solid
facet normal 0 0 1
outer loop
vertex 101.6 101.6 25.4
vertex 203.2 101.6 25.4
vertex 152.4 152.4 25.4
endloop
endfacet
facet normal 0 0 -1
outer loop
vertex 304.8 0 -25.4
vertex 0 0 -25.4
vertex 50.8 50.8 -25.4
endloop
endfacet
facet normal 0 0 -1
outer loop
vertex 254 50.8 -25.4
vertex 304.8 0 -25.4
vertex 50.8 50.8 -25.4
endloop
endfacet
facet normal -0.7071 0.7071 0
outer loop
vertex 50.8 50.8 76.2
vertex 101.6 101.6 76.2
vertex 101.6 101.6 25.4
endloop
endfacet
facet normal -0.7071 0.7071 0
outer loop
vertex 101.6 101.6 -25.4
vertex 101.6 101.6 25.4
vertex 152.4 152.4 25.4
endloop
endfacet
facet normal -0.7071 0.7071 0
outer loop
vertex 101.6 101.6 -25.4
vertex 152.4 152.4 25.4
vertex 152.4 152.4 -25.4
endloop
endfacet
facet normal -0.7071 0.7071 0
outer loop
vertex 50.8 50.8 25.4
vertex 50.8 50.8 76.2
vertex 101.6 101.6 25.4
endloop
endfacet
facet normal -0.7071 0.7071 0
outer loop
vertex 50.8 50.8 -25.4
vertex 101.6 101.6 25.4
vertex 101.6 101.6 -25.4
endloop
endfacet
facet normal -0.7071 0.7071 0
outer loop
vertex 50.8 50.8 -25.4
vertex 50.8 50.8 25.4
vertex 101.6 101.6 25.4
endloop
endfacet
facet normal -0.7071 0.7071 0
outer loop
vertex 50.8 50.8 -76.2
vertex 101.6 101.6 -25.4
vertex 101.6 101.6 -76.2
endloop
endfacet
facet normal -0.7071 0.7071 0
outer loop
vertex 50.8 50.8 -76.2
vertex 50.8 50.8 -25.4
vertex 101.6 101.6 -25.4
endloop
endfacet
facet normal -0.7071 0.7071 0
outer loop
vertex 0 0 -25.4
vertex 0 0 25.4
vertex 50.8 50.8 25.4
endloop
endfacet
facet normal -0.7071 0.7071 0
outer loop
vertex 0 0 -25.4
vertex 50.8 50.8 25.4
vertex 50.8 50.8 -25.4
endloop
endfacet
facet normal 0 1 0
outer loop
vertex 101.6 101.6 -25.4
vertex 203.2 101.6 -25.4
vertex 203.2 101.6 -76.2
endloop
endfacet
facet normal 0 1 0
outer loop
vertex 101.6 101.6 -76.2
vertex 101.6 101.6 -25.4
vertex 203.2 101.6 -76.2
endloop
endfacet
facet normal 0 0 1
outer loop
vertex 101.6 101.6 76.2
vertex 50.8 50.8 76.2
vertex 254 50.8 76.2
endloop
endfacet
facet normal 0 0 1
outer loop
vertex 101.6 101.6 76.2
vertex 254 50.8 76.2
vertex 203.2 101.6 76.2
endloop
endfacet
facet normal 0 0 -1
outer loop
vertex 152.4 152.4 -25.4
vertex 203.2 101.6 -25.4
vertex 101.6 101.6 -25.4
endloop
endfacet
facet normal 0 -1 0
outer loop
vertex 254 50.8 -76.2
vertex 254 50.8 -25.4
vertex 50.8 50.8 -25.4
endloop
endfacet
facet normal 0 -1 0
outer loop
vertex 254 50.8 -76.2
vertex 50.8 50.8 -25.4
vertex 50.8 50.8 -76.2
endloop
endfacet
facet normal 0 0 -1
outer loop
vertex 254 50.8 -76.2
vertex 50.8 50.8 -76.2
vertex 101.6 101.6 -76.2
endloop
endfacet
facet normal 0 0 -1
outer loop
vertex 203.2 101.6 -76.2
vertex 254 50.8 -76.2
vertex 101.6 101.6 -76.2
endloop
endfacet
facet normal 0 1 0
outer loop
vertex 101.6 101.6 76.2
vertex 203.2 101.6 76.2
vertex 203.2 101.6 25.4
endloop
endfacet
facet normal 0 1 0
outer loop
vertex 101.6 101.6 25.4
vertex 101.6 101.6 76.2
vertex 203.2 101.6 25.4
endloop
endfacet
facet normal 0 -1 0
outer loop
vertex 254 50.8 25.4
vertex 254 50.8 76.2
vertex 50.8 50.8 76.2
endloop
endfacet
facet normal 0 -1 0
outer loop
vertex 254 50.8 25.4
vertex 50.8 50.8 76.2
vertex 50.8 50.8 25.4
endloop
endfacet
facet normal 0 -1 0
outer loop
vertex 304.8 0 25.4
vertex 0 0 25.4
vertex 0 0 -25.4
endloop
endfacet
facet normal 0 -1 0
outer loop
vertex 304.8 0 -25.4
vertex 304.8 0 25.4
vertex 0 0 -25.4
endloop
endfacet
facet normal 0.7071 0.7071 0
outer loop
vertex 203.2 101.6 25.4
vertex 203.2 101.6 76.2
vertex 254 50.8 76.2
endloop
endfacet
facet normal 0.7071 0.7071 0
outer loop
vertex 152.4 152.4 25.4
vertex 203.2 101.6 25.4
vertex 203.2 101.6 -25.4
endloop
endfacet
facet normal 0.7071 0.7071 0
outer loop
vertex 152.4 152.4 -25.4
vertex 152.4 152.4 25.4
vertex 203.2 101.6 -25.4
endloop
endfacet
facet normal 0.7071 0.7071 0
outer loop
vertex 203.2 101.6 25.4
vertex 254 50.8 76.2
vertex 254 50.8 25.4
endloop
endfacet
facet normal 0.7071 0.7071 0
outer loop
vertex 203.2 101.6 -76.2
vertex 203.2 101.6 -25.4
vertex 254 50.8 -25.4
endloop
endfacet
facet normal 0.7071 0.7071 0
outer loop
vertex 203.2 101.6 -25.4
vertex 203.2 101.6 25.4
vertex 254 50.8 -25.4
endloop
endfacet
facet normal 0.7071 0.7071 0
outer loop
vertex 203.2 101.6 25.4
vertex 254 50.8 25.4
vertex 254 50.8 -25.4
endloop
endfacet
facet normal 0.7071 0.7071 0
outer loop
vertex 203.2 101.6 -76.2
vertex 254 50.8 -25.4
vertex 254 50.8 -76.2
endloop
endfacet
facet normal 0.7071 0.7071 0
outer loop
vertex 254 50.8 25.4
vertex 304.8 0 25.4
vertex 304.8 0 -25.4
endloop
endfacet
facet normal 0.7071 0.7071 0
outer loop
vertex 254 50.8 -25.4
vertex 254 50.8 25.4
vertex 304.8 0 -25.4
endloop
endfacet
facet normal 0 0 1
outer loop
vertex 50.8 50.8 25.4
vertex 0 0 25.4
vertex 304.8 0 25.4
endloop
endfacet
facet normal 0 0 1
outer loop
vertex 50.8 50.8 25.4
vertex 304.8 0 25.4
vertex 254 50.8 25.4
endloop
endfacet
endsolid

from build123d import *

# Parameters (mm, degrees)
SKETCH1_W           = 50.8
SKETCH1_H           = 152.4
SKETCH1_W_2         = 152.4
SKETCH1_H_2         = 50.8
EXTRUDE_THIN1_DEPTH = 304.8
CHAMFER1_SIZE       = 152.4


with BuildPart() as part:
    # Sketch1 → Extrude-Thin1 (new body)
    with BuildSketch(Plane(origin=(0, 0, 0), x_dir=(0, 0, -1), z_dir=(1, 0, 0))):
        with Locations((0, 76.2)):
            Rectangle(SKETCH1_W, SKETCH1_H)
        with Locations((0, 76.2)):
            Rectangle(SKETCH1_W_2, SKETCH1_H_2)
    extrude(amount=EXTRUDE_THIN1_DEPTH)

    # Chamfer1
    chamfer1_edges = [part.edges().sort_by_distance(p)[0] for p in [
        (304.8, 152.4, 0),
        (0, 152.4, 0),
    ]]
    chamfer(chamfer1_edges, length=CHAMFER1_SIZE - 0.0001)  # a hair under: the kernel refuses the full size


solid = part.part
